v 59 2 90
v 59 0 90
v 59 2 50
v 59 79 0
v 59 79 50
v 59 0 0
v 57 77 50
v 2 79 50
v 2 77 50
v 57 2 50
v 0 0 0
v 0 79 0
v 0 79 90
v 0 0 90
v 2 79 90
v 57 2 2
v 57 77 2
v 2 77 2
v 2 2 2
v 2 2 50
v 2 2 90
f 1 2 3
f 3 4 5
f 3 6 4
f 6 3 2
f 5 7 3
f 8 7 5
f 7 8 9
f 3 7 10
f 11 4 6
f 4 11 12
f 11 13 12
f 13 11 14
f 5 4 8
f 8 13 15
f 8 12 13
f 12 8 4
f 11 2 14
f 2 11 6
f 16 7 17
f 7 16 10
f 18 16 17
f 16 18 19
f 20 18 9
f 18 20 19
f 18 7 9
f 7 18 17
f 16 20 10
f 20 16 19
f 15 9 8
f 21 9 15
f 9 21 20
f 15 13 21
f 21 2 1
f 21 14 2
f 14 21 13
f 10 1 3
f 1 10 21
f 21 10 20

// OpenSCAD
h = 50;
size = 59;
w = 79;
// bottom
difference(){
    cube([size,w,h]);
    translate([2,2,2]){
        cube([size-4,w-4,h]);
    }
}

// baffle
bh = 40;
translate([0,0,h]){
    cube([2,w,bh]);
}

translate([0,0,h]){
    cube([size,2,bh]);
}
